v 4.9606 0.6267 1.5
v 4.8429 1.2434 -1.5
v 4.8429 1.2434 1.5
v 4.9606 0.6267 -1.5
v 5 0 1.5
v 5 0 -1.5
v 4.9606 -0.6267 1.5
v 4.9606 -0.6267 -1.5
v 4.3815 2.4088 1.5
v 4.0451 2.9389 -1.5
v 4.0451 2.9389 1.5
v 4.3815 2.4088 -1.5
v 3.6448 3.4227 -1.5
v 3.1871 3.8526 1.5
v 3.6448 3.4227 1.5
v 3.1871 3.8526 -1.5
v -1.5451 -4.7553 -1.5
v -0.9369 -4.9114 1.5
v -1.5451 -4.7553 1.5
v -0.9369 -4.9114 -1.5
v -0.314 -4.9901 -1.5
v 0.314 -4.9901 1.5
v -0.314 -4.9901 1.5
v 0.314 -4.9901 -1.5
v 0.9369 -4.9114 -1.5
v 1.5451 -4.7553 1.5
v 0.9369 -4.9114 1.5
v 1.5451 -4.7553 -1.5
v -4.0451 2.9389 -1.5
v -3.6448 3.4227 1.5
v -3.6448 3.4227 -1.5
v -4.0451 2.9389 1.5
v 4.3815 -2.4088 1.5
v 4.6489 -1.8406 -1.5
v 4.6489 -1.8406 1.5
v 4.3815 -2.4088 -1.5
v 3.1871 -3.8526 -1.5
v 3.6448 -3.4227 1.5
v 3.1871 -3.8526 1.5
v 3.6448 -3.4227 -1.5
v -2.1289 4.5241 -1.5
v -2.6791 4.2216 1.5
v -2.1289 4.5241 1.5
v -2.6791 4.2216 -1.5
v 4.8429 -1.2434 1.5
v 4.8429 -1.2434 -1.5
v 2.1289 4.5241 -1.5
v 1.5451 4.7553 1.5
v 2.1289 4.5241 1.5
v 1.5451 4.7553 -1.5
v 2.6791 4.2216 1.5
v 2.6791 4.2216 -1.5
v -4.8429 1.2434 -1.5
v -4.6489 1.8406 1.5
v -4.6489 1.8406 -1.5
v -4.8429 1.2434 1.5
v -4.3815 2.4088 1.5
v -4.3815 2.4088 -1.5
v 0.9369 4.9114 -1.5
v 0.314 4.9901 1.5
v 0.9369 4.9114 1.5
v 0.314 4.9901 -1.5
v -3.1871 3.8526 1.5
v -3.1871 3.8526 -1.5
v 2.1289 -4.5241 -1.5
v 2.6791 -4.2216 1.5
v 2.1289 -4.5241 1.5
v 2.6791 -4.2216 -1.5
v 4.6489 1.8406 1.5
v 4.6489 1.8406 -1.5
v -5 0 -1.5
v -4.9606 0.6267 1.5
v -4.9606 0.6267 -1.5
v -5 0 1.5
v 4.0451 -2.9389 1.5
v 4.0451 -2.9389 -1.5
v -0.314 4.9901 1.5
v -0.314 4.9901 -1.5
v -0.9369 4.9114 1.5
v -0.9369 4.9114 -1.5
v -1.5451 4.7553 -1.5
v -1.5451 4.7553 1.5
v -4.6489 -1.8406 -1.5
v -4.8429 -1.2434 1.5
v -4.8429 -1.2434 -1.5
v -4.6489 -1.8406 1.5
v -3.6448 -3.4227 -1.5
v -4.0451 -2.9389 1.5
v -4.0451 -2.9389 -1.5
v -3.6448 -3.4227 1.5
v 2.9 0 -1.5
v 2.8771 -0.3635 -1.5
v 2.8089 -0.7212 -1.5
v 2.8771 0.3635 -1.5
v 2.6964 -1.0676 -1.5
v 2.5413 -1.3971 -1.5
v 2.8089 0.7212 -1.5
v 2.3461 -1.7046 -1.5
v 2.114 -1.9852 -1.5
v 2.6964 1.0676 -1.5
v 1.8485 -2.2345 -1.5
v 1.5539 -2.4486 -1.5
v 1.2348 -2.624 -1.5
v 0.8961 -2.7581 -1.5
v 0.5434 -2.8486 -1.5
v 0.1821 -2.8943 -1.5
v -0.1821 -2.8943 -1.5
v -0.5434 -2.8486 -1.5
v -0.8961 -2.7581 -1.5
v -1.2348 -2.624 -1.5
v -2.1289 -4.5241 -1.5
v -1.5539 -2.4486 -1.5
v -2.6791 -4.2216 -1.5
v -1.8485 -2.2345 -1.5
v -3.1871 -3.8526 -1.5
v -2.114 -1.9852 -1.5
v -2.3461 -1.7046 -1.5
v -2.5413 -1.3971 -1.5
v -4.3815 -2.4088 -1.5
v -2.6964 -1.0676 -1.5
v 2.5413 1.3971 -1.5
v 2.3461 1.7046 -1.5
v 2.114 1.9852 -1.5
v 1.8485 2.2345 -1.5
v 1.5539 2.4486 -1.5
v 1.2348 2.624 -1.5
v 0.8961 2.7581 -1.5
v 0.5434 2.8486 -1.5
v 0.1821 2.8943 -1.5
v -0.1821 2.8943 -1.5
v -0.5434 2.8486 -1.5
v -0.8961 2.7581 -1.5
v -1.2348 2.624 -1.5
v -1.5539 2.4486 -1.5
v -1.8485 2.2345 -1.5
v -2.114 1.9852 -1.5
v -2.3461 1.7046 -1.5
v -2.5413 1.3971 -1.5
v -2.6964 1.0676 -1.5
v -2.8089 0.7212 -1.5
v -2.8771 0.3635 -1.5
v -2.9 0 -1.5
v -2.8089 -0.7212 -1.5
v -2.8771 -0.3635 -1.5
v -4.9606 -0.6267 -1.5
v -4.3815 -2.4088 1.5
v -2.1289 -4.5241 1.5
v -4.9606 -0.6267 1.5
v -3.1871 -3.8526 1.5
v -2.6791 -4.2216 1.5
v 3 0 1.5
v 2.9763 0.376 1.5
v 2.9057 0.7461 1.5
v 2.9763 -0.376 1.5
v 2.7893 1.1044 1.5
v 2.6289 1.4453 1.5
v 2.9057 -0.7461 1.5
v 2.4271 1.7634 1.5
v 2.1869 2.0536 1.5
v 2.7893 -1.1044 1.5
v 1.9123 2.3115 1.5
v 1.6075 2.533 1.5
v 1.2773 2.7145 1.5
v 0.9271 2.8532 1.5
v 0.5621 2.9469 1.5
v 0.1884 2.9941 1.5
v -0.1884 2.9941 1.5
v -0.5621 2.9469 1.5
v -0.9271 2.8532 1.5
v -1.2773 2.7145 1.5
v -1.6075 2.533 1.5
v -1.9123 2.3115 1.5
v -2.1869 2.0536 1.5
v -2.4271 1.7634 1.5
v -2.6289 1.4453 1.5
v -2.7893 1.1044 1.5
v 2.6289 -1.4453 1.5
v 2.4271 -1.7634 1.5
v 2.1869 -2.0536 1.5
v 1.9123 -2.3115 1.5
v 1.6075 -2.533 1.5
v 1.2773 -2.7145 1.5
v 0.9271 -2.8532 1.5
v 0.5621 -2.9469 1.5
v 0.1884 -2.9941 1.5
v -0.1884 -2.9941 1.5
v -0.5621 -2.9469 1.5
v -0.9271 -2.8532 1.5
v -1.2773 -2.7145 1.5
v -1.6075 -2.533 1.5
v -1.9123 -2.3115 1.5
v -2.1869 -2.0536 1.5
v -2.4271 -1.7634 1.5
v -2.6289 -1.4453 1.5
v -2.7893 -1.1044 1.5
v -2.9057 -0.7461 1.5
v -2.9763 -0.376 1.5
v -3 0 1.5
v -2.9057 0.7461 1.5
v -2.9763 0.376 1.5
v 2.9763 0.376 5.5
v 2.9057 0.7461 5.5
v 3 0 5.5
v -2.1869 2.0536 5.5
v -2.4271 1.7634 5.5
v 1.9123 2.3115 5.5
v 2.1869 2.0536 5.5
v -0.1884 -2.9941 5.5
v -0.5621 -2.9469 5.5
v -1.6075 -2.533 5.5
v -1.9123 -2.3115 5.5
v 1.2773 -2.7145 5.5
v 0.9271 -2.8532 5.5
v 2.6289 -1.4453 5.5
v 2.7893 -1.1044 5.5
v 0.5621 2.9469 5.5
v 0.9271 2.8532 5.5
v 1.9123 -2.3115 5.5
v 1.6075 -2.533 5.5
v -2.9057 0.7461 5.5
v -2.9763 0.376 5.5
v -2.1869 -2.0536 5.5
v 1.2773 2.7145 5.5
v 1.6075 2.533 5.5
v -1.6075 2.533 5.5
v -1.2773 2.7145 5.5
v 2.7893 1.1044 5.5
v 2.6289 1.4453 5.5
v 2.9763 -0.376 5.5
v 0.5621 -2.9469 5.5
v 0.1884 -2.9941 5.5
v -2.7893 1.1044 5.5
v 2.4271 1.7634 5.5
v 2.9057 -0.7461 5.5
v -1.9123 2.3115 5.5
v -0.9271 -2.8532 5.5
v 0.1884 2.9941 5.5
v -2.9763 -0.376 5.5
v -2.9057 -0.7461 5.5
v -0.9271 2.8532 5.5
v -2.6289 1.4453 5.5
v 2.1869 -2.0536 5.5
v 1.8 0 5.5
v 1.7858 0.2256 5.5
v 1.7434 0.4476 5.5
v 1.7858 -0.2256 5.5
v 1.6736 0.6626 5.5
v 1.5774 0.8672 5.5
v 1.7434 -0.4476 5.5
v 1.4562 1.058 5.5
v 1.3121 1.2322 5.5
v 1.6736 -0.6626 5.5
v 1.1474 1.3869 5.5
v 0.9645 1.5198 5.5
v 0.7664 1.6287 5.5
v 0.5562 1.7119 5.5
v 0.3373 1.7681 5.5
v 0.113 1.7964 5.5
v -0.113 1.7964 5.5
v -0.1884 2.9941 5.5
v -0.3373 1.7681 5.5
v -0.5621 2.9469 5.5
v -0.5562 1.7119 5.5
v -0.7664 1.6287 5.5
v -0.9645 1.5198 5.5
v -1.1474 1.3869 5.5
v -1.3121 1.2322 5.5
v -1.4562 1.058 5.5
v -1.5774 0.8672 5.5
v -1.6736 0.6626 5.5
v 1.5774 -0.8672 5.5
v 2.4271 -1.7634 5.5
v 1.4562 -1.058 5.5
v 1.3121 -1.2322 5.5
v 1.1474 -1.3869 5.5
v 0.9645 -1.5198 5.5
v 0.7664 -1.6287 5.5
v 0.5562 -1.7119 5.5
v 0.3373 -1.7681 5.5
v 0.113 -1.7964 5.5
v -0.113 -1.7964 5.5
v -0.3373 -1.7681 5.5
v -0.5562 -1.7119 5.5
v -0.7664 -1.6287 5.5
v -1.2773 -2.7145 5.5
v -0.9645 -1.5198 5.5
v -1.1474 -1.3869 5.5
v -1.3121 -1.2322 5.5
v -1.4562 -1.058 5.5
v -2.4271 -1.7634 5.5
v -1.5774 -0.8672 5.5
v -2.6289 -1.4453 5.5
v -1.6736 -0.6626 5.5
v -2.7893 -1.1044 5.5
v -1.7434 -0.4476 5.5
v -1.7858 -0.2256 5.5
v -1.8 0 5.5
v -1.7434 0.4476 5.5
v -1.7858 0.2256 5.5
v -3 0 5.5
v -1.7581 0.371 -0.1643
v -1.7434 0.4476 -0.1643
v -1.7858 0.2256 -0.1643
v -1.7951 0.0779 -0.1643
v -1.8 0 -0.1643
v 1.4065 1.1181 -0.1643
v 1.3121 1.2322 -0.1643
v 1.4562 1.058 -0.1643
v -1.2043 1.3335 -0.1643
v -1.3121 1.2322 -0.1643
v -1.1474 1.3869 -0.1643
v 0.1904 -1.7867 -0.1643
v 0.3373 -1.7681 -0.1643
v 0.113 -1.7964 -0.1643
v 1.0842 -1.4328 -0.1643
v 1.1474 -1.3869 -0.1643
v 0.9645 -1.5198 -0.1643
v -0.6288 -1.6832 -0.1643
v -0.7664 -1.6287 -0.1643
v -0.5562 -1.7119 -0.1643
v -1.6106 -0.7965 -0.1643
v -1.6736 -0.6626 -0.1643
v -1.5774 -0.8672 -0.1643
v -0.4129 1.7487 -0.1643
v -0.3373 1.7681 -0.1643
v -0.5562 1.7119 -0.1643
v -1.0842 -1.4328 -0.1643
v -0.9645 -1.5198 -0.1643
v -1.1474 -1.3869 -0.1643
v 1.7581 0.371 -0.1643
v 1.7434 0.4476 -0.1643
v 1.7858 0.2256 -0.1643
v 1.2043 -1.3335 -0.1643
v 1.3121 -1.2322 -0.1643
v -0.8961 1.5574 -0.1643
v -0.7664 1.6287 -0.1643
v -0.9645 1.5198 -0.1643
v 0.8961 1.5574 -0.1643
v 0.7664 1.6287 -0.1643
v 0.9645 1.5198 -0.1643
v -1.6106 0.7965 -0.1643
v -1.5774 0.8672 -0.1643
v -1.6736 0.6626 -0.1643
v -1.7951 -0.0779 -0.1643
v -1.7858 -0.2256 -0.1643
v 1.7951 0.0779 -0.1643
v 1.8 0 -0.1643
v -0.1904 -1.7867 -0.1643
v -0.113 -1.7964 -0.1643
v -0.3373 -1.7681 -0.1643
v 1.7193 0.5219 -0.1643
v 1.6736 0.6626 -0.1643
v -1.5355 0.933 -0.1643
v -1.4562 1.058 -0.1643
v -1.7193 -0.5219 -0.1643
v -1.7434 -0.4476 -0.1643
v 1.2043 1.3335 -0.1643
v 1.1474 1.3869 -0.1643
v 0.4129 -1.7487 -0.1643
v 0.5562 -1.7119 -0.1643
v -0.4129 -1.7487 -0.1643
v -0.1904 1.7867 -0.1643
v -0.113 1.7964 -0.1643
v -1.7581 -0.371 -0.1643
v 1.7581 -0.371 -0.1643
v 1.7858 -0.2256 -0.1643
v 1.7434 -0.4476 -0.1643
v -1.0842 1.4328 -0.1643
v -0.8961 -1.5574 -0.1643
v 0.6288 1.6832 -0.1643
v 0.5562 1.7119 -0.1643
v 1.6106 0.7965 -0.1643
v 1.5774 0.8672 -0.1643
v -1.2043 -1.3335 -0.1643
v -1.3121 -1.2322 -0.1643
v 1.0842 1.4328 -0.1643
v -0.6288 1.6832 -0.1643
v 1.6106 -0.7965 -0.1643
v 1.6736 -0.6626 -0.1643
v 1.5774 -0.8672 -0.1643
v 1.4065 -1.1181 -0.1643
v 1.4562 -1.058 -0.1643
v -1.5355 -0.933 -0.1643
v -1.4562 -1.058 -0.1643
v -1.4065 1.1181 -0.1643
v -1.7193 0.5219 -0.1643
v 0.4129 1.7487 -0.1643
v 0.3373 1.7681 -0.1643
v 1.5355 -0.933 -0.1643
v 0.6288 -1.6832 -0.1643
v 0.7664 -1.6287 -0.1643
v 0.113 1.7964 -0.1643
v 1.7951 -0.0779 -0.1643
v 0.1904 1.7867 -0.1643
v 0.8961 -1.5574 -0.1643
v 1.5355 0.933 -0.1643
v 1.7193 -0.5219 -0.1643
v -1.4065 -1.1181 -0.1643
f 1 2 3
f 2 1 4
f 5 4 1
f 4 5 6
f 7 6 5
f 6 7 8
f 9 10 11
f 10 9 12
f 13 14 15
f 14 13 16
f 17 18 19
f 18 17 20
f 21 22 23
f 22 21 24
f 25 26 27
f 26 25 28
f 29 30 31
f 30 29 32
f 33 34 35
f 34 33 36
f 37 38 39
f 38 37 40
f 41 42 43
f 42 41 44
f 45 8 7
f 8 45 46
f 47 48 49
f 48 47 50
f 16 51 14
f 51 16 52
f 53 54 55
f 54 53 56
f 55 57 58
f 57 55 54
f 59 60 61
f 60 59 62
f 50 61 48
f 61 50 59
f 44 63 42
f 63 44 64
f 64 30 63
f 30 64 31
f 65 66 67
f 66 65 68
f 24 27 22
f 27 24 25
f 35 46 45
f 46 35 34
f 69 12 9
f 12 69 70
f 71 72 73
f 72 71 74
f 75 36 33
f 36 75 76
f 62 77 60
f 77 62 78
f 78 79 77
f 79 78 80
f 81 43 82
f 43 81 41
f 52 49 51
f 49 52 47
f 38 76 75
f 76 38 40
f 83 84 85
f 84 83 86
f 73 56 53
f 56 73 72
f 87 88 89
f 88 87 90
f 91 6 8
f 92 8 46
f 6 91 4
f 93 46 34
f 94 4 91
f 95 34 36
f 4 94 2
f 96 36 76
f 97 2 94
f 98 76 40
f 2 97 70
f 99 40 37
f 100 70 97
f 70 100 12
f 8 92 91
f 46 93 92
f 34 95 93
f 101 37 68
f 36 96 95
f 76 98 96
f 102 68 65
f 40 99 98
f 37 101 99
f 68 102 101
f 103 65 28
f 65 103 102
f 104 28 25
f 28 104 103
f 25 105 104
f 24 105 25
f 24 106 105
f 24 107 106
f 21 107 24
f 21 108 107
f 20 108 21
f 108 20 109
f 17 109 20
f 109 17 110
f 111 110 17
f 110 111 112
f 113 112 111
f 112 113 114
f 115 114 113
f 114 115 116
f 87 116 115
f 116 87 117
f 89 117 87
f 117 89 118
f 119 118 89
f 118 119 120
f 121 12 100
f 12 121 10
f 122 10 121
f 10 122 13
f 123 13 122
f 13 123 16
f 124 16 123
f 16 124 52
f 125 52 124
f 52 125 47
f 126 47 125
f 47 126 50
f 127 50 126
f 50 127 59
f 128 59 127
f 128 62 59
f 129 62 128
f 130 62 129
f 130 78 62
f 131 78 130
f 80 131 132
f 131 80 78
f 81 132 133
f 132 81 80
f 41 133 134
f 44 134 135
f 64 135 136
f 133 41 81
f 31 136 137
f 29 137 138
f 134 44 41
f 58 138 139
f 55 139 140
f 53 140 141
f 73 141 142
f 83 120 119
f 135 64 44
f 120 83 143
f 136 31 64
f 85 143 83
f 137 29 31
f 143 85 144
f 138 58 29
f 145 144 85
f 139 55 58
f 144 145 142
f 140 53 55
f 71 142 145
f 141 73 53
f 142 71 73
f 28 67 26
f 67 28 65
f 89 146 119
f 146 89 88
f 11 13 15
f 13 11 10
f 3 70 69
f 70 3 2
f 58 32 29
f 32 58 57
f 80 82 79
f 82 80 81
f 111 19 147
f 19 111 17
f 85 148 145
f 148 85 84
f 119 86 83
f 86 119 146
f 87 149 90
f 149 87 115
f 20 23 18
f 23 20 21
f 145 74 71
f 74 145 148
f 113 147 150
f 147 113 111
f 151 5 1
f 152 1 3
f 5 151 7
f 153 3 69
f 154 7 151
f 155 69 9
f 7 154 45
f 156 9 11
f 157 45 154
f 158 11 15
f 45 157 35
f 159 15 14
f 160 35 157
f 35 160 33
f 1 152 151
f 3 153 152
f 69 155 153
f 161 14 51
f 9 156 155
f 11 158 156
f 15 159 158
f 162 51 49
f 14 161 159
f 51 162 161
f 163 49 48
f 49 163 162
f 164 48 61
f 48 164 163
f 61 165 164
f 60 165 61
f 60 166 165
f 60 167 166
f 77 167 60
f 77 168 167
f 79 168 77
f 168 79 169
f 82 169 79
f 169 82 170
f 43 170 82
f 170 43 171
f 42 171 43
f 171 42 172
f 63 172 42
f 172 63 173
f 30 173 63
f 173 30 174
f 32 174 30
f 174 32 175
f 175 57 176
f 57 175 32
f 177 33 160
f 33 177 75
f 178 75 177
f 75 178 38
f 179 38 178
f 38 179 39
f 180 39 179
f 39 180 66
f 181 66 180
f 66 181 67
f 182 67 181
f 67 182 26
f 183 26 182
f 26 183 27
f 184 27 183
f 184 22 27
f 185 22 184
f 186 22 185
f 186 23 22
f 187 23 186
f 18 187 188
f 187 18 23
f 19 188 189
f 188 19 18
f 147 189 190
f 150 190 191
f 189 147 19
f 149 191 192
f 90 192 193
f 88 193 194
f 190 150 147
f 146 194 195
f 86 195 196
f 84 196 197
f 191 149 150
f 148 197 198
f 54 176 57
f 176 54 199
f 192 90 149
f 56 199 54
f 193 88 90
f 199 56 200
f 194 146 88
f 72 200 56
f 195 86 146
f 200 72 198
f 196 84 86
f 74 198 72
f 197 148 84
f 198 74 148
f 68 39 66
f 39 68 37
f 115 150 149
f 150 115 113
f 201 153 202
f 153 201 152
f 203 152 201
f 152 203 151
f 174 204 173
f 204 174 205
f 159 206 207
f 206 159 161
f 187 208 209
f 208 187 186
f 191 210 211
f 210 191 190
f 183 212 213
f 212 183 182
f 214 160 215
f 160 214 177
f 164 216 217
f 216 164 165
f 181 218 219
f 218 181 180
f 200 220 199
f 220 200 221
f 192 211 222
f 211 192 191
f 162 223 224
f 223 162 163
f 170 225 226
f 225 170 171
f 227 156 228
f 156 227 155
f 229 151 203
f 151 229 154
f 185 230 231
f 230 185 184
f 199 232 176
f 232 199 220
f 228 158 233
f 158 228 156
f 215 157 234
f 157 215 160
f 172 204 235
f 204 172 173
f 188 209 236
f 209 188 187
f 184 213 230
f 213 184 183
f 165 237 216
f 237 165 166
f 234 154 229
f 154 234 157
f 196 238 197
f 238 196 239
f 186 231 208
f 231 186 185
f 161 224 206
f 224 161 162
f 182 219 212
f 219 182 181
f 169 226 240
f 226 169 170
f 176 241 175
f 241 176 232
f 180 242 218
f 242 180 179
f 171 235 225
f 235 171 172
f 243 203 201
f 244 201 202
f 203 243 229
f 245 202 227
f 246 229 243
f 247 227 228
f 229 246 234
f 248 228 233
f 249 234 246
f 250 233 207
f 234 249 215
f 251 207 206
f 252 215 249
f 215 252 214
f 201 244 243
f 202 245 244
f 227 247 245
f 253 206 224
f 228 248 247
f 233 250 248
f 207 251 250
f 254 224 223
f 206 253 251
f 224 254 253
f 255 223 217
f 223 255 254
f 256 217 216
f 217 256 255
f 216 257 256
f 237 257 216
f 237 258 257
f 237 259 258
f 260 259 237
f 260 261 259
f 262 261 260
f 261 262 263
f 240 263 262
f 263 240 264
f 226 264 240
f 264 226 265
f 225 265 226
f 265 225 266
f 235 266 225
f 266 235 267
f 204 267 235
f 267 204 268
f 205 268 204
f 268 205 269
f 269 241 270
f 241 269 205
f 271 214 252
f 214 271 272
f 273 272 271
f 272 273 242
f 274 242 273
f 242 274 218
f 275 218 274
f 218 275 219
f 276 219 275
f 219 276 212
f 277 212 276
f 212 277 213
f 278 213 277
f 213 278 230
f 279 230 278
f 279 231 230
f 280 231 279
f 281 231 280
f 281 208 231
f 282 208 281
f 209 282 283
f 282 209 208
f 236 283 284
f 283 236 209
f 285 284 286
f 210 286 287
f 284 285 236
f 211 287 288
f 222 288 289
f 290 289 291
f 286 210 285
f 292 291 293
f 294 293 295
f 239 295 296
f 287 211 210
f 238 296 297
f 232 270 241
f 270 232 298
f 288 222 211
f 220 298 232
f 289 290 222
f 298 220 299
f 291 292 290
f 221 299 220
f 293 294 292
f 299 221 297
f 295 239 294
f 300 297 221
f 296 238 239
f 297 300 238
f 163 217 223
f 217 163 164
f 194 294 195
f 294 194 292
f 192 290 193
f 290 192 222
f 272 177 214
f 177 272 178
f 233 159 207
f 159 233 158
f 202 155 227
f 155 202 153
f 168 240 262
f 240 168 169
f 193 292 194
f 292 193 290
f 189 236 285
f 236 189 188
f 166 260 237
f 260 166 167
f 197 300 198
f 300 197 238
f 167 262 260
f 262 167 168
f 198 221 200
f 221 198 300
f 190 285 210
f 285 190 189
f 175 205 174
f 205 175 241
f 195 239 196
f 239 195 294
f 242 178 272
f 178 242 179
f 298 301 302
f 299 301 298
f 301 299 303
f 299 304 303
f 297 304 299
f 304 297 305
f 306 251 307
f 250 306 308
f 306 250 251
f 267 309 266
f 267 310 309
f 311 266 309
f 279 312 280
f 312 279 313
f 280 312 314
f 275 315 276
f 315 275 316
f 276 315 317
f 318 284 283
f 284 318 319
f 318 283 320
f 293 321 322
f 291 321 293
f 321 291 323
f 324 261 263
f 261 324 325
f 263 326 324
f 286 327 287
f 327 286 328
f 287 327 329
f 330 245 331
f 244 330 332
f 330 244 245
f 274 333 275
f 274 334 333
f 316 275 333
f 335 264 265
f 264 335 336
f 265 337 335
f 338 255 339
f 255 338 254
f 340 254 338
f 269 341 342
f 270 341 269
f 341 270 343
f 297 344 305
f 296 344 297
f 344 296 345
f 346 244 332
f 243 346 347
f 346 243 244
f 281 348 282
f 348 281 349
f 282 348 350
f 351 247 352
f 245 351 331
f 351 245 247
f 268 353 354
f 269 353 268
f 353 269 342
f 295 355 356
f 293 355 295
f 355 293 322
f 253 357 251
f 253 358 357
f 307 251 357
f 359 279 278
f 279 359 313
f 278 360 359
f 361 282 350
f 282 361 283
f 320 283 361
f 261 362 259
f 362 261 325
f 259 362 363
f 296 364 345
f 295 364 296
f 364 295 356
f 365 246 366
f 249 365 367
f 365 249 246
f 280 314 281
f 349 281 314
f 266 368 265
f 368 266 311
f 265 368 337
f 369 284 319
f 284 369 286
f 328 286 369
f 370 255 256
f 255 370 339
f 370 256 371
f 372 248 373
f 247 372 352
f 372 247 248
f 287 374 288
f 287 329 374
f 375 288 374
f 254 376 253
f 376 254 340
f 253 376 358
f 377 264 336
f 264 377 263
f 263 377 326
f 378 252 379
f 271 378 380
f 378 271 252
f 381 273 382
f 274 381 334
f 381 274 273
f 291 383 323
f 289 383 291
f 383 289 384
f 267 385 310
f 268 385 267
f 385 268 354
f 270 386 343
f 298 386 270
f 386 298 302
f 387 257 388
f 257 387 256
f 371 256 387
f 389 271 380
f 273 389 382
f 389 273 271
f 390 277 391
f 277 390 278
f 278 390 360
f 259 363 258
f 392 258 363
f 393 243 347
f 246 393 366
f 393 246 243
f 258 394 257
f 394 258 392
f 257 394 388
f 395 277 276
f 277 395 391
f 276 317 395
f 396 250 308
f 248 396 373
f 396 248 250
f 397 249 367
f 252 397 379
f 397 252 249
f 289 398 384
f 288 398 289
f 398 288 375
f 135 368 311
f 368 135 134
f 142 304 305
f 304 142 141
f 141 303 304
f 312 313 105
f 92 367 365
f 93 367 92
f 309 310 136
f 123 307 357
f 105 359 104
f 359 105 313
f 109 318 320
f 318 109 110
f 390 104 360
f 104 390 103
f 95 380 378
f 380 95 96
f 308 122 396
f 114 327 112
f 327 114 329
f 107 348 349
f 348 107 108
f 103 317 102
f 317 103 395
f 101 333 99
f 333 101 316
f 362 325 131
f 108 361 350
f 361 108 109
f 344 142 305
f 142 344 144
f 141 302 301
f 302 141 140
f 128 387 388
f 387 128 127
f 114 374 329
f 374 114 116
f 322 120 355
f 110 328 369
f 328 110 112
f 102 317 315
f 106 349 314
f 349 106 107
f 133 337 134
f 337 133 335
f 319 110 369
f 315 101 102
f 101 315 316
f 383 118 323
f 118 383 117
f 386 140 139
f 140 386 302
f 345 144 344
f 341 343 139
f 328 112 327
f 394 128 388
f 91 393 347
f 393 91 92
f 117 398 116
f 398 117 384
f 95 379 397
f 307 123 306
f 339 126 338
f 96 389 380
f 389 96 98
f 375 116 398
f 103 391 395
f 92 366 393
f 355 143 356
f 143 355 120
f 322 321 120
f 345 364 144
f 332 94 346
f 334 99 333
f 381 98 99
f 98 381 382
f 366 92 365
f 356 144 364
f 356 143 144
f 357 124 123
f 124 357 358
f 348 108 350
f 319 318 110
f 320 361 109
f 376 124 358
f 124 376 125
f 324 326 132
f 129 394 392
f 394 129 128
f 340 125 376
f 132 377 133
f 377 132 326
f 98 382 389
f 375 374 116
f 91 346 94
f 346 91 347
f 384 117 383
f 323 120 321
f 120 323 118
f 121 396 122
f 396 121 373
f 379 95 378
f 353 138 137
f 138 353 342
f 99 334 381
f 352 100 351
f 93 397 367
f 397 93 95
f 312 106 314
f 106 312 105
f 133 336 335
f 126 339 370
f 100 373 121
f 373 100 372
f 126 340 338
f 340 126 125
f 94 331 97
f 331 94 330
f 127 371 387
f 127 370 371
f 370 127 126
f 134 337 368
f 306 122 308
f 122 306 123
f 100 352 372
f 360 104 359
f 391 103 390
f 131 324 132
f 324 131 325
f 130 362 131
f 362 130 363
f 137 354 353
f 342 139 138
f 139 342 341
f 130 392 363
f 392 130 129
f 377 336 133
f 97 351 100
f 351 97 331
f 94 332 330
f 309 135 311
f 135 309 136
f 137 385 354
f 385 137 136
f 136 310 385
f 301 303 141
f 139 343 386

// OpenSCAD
$fn = 50;


difference() {
	union() {
		translate(v = [0, 0, -1.5000000000]) {
			cylinder(h = 3, r = 5.0000000000);
		}
		translate(v = [0, 0, -1.5000000000]) {
			cylinder(h = 7, r = 3.0000000000);
		}
	}
	union() {
		translate(v = [0, 0, -1.5000000000]) {
			rotate(a = [0, 180, 0]) {
				difference() {
					union() {
						translate(v = [0, 0, -7.0000000000]) {
							cylinder(h = 7, r = 1.5000000000);
						}
						translate(v = [0, 0, -7.0000000000]) {
							cylinder(h = 7, r = 1.8000000000);
						}
						translate(v = [0, 0, -1.7000000000]) {
							cylinder(h = 1.7000000000, r1 = 1.5000000000, r2 = 2.9000000000);
						}
						translate(v = [0, 0, -7.0000000000]) {
							cylinder(h = 7, r = 1.5000000000);
						}
					}
					union();
				}
			}
		}
		translate(v = [0, 0, -50.0000000000]) {
			cylinder(h = 100, r = 1.5000000000);
		}
	}
}
